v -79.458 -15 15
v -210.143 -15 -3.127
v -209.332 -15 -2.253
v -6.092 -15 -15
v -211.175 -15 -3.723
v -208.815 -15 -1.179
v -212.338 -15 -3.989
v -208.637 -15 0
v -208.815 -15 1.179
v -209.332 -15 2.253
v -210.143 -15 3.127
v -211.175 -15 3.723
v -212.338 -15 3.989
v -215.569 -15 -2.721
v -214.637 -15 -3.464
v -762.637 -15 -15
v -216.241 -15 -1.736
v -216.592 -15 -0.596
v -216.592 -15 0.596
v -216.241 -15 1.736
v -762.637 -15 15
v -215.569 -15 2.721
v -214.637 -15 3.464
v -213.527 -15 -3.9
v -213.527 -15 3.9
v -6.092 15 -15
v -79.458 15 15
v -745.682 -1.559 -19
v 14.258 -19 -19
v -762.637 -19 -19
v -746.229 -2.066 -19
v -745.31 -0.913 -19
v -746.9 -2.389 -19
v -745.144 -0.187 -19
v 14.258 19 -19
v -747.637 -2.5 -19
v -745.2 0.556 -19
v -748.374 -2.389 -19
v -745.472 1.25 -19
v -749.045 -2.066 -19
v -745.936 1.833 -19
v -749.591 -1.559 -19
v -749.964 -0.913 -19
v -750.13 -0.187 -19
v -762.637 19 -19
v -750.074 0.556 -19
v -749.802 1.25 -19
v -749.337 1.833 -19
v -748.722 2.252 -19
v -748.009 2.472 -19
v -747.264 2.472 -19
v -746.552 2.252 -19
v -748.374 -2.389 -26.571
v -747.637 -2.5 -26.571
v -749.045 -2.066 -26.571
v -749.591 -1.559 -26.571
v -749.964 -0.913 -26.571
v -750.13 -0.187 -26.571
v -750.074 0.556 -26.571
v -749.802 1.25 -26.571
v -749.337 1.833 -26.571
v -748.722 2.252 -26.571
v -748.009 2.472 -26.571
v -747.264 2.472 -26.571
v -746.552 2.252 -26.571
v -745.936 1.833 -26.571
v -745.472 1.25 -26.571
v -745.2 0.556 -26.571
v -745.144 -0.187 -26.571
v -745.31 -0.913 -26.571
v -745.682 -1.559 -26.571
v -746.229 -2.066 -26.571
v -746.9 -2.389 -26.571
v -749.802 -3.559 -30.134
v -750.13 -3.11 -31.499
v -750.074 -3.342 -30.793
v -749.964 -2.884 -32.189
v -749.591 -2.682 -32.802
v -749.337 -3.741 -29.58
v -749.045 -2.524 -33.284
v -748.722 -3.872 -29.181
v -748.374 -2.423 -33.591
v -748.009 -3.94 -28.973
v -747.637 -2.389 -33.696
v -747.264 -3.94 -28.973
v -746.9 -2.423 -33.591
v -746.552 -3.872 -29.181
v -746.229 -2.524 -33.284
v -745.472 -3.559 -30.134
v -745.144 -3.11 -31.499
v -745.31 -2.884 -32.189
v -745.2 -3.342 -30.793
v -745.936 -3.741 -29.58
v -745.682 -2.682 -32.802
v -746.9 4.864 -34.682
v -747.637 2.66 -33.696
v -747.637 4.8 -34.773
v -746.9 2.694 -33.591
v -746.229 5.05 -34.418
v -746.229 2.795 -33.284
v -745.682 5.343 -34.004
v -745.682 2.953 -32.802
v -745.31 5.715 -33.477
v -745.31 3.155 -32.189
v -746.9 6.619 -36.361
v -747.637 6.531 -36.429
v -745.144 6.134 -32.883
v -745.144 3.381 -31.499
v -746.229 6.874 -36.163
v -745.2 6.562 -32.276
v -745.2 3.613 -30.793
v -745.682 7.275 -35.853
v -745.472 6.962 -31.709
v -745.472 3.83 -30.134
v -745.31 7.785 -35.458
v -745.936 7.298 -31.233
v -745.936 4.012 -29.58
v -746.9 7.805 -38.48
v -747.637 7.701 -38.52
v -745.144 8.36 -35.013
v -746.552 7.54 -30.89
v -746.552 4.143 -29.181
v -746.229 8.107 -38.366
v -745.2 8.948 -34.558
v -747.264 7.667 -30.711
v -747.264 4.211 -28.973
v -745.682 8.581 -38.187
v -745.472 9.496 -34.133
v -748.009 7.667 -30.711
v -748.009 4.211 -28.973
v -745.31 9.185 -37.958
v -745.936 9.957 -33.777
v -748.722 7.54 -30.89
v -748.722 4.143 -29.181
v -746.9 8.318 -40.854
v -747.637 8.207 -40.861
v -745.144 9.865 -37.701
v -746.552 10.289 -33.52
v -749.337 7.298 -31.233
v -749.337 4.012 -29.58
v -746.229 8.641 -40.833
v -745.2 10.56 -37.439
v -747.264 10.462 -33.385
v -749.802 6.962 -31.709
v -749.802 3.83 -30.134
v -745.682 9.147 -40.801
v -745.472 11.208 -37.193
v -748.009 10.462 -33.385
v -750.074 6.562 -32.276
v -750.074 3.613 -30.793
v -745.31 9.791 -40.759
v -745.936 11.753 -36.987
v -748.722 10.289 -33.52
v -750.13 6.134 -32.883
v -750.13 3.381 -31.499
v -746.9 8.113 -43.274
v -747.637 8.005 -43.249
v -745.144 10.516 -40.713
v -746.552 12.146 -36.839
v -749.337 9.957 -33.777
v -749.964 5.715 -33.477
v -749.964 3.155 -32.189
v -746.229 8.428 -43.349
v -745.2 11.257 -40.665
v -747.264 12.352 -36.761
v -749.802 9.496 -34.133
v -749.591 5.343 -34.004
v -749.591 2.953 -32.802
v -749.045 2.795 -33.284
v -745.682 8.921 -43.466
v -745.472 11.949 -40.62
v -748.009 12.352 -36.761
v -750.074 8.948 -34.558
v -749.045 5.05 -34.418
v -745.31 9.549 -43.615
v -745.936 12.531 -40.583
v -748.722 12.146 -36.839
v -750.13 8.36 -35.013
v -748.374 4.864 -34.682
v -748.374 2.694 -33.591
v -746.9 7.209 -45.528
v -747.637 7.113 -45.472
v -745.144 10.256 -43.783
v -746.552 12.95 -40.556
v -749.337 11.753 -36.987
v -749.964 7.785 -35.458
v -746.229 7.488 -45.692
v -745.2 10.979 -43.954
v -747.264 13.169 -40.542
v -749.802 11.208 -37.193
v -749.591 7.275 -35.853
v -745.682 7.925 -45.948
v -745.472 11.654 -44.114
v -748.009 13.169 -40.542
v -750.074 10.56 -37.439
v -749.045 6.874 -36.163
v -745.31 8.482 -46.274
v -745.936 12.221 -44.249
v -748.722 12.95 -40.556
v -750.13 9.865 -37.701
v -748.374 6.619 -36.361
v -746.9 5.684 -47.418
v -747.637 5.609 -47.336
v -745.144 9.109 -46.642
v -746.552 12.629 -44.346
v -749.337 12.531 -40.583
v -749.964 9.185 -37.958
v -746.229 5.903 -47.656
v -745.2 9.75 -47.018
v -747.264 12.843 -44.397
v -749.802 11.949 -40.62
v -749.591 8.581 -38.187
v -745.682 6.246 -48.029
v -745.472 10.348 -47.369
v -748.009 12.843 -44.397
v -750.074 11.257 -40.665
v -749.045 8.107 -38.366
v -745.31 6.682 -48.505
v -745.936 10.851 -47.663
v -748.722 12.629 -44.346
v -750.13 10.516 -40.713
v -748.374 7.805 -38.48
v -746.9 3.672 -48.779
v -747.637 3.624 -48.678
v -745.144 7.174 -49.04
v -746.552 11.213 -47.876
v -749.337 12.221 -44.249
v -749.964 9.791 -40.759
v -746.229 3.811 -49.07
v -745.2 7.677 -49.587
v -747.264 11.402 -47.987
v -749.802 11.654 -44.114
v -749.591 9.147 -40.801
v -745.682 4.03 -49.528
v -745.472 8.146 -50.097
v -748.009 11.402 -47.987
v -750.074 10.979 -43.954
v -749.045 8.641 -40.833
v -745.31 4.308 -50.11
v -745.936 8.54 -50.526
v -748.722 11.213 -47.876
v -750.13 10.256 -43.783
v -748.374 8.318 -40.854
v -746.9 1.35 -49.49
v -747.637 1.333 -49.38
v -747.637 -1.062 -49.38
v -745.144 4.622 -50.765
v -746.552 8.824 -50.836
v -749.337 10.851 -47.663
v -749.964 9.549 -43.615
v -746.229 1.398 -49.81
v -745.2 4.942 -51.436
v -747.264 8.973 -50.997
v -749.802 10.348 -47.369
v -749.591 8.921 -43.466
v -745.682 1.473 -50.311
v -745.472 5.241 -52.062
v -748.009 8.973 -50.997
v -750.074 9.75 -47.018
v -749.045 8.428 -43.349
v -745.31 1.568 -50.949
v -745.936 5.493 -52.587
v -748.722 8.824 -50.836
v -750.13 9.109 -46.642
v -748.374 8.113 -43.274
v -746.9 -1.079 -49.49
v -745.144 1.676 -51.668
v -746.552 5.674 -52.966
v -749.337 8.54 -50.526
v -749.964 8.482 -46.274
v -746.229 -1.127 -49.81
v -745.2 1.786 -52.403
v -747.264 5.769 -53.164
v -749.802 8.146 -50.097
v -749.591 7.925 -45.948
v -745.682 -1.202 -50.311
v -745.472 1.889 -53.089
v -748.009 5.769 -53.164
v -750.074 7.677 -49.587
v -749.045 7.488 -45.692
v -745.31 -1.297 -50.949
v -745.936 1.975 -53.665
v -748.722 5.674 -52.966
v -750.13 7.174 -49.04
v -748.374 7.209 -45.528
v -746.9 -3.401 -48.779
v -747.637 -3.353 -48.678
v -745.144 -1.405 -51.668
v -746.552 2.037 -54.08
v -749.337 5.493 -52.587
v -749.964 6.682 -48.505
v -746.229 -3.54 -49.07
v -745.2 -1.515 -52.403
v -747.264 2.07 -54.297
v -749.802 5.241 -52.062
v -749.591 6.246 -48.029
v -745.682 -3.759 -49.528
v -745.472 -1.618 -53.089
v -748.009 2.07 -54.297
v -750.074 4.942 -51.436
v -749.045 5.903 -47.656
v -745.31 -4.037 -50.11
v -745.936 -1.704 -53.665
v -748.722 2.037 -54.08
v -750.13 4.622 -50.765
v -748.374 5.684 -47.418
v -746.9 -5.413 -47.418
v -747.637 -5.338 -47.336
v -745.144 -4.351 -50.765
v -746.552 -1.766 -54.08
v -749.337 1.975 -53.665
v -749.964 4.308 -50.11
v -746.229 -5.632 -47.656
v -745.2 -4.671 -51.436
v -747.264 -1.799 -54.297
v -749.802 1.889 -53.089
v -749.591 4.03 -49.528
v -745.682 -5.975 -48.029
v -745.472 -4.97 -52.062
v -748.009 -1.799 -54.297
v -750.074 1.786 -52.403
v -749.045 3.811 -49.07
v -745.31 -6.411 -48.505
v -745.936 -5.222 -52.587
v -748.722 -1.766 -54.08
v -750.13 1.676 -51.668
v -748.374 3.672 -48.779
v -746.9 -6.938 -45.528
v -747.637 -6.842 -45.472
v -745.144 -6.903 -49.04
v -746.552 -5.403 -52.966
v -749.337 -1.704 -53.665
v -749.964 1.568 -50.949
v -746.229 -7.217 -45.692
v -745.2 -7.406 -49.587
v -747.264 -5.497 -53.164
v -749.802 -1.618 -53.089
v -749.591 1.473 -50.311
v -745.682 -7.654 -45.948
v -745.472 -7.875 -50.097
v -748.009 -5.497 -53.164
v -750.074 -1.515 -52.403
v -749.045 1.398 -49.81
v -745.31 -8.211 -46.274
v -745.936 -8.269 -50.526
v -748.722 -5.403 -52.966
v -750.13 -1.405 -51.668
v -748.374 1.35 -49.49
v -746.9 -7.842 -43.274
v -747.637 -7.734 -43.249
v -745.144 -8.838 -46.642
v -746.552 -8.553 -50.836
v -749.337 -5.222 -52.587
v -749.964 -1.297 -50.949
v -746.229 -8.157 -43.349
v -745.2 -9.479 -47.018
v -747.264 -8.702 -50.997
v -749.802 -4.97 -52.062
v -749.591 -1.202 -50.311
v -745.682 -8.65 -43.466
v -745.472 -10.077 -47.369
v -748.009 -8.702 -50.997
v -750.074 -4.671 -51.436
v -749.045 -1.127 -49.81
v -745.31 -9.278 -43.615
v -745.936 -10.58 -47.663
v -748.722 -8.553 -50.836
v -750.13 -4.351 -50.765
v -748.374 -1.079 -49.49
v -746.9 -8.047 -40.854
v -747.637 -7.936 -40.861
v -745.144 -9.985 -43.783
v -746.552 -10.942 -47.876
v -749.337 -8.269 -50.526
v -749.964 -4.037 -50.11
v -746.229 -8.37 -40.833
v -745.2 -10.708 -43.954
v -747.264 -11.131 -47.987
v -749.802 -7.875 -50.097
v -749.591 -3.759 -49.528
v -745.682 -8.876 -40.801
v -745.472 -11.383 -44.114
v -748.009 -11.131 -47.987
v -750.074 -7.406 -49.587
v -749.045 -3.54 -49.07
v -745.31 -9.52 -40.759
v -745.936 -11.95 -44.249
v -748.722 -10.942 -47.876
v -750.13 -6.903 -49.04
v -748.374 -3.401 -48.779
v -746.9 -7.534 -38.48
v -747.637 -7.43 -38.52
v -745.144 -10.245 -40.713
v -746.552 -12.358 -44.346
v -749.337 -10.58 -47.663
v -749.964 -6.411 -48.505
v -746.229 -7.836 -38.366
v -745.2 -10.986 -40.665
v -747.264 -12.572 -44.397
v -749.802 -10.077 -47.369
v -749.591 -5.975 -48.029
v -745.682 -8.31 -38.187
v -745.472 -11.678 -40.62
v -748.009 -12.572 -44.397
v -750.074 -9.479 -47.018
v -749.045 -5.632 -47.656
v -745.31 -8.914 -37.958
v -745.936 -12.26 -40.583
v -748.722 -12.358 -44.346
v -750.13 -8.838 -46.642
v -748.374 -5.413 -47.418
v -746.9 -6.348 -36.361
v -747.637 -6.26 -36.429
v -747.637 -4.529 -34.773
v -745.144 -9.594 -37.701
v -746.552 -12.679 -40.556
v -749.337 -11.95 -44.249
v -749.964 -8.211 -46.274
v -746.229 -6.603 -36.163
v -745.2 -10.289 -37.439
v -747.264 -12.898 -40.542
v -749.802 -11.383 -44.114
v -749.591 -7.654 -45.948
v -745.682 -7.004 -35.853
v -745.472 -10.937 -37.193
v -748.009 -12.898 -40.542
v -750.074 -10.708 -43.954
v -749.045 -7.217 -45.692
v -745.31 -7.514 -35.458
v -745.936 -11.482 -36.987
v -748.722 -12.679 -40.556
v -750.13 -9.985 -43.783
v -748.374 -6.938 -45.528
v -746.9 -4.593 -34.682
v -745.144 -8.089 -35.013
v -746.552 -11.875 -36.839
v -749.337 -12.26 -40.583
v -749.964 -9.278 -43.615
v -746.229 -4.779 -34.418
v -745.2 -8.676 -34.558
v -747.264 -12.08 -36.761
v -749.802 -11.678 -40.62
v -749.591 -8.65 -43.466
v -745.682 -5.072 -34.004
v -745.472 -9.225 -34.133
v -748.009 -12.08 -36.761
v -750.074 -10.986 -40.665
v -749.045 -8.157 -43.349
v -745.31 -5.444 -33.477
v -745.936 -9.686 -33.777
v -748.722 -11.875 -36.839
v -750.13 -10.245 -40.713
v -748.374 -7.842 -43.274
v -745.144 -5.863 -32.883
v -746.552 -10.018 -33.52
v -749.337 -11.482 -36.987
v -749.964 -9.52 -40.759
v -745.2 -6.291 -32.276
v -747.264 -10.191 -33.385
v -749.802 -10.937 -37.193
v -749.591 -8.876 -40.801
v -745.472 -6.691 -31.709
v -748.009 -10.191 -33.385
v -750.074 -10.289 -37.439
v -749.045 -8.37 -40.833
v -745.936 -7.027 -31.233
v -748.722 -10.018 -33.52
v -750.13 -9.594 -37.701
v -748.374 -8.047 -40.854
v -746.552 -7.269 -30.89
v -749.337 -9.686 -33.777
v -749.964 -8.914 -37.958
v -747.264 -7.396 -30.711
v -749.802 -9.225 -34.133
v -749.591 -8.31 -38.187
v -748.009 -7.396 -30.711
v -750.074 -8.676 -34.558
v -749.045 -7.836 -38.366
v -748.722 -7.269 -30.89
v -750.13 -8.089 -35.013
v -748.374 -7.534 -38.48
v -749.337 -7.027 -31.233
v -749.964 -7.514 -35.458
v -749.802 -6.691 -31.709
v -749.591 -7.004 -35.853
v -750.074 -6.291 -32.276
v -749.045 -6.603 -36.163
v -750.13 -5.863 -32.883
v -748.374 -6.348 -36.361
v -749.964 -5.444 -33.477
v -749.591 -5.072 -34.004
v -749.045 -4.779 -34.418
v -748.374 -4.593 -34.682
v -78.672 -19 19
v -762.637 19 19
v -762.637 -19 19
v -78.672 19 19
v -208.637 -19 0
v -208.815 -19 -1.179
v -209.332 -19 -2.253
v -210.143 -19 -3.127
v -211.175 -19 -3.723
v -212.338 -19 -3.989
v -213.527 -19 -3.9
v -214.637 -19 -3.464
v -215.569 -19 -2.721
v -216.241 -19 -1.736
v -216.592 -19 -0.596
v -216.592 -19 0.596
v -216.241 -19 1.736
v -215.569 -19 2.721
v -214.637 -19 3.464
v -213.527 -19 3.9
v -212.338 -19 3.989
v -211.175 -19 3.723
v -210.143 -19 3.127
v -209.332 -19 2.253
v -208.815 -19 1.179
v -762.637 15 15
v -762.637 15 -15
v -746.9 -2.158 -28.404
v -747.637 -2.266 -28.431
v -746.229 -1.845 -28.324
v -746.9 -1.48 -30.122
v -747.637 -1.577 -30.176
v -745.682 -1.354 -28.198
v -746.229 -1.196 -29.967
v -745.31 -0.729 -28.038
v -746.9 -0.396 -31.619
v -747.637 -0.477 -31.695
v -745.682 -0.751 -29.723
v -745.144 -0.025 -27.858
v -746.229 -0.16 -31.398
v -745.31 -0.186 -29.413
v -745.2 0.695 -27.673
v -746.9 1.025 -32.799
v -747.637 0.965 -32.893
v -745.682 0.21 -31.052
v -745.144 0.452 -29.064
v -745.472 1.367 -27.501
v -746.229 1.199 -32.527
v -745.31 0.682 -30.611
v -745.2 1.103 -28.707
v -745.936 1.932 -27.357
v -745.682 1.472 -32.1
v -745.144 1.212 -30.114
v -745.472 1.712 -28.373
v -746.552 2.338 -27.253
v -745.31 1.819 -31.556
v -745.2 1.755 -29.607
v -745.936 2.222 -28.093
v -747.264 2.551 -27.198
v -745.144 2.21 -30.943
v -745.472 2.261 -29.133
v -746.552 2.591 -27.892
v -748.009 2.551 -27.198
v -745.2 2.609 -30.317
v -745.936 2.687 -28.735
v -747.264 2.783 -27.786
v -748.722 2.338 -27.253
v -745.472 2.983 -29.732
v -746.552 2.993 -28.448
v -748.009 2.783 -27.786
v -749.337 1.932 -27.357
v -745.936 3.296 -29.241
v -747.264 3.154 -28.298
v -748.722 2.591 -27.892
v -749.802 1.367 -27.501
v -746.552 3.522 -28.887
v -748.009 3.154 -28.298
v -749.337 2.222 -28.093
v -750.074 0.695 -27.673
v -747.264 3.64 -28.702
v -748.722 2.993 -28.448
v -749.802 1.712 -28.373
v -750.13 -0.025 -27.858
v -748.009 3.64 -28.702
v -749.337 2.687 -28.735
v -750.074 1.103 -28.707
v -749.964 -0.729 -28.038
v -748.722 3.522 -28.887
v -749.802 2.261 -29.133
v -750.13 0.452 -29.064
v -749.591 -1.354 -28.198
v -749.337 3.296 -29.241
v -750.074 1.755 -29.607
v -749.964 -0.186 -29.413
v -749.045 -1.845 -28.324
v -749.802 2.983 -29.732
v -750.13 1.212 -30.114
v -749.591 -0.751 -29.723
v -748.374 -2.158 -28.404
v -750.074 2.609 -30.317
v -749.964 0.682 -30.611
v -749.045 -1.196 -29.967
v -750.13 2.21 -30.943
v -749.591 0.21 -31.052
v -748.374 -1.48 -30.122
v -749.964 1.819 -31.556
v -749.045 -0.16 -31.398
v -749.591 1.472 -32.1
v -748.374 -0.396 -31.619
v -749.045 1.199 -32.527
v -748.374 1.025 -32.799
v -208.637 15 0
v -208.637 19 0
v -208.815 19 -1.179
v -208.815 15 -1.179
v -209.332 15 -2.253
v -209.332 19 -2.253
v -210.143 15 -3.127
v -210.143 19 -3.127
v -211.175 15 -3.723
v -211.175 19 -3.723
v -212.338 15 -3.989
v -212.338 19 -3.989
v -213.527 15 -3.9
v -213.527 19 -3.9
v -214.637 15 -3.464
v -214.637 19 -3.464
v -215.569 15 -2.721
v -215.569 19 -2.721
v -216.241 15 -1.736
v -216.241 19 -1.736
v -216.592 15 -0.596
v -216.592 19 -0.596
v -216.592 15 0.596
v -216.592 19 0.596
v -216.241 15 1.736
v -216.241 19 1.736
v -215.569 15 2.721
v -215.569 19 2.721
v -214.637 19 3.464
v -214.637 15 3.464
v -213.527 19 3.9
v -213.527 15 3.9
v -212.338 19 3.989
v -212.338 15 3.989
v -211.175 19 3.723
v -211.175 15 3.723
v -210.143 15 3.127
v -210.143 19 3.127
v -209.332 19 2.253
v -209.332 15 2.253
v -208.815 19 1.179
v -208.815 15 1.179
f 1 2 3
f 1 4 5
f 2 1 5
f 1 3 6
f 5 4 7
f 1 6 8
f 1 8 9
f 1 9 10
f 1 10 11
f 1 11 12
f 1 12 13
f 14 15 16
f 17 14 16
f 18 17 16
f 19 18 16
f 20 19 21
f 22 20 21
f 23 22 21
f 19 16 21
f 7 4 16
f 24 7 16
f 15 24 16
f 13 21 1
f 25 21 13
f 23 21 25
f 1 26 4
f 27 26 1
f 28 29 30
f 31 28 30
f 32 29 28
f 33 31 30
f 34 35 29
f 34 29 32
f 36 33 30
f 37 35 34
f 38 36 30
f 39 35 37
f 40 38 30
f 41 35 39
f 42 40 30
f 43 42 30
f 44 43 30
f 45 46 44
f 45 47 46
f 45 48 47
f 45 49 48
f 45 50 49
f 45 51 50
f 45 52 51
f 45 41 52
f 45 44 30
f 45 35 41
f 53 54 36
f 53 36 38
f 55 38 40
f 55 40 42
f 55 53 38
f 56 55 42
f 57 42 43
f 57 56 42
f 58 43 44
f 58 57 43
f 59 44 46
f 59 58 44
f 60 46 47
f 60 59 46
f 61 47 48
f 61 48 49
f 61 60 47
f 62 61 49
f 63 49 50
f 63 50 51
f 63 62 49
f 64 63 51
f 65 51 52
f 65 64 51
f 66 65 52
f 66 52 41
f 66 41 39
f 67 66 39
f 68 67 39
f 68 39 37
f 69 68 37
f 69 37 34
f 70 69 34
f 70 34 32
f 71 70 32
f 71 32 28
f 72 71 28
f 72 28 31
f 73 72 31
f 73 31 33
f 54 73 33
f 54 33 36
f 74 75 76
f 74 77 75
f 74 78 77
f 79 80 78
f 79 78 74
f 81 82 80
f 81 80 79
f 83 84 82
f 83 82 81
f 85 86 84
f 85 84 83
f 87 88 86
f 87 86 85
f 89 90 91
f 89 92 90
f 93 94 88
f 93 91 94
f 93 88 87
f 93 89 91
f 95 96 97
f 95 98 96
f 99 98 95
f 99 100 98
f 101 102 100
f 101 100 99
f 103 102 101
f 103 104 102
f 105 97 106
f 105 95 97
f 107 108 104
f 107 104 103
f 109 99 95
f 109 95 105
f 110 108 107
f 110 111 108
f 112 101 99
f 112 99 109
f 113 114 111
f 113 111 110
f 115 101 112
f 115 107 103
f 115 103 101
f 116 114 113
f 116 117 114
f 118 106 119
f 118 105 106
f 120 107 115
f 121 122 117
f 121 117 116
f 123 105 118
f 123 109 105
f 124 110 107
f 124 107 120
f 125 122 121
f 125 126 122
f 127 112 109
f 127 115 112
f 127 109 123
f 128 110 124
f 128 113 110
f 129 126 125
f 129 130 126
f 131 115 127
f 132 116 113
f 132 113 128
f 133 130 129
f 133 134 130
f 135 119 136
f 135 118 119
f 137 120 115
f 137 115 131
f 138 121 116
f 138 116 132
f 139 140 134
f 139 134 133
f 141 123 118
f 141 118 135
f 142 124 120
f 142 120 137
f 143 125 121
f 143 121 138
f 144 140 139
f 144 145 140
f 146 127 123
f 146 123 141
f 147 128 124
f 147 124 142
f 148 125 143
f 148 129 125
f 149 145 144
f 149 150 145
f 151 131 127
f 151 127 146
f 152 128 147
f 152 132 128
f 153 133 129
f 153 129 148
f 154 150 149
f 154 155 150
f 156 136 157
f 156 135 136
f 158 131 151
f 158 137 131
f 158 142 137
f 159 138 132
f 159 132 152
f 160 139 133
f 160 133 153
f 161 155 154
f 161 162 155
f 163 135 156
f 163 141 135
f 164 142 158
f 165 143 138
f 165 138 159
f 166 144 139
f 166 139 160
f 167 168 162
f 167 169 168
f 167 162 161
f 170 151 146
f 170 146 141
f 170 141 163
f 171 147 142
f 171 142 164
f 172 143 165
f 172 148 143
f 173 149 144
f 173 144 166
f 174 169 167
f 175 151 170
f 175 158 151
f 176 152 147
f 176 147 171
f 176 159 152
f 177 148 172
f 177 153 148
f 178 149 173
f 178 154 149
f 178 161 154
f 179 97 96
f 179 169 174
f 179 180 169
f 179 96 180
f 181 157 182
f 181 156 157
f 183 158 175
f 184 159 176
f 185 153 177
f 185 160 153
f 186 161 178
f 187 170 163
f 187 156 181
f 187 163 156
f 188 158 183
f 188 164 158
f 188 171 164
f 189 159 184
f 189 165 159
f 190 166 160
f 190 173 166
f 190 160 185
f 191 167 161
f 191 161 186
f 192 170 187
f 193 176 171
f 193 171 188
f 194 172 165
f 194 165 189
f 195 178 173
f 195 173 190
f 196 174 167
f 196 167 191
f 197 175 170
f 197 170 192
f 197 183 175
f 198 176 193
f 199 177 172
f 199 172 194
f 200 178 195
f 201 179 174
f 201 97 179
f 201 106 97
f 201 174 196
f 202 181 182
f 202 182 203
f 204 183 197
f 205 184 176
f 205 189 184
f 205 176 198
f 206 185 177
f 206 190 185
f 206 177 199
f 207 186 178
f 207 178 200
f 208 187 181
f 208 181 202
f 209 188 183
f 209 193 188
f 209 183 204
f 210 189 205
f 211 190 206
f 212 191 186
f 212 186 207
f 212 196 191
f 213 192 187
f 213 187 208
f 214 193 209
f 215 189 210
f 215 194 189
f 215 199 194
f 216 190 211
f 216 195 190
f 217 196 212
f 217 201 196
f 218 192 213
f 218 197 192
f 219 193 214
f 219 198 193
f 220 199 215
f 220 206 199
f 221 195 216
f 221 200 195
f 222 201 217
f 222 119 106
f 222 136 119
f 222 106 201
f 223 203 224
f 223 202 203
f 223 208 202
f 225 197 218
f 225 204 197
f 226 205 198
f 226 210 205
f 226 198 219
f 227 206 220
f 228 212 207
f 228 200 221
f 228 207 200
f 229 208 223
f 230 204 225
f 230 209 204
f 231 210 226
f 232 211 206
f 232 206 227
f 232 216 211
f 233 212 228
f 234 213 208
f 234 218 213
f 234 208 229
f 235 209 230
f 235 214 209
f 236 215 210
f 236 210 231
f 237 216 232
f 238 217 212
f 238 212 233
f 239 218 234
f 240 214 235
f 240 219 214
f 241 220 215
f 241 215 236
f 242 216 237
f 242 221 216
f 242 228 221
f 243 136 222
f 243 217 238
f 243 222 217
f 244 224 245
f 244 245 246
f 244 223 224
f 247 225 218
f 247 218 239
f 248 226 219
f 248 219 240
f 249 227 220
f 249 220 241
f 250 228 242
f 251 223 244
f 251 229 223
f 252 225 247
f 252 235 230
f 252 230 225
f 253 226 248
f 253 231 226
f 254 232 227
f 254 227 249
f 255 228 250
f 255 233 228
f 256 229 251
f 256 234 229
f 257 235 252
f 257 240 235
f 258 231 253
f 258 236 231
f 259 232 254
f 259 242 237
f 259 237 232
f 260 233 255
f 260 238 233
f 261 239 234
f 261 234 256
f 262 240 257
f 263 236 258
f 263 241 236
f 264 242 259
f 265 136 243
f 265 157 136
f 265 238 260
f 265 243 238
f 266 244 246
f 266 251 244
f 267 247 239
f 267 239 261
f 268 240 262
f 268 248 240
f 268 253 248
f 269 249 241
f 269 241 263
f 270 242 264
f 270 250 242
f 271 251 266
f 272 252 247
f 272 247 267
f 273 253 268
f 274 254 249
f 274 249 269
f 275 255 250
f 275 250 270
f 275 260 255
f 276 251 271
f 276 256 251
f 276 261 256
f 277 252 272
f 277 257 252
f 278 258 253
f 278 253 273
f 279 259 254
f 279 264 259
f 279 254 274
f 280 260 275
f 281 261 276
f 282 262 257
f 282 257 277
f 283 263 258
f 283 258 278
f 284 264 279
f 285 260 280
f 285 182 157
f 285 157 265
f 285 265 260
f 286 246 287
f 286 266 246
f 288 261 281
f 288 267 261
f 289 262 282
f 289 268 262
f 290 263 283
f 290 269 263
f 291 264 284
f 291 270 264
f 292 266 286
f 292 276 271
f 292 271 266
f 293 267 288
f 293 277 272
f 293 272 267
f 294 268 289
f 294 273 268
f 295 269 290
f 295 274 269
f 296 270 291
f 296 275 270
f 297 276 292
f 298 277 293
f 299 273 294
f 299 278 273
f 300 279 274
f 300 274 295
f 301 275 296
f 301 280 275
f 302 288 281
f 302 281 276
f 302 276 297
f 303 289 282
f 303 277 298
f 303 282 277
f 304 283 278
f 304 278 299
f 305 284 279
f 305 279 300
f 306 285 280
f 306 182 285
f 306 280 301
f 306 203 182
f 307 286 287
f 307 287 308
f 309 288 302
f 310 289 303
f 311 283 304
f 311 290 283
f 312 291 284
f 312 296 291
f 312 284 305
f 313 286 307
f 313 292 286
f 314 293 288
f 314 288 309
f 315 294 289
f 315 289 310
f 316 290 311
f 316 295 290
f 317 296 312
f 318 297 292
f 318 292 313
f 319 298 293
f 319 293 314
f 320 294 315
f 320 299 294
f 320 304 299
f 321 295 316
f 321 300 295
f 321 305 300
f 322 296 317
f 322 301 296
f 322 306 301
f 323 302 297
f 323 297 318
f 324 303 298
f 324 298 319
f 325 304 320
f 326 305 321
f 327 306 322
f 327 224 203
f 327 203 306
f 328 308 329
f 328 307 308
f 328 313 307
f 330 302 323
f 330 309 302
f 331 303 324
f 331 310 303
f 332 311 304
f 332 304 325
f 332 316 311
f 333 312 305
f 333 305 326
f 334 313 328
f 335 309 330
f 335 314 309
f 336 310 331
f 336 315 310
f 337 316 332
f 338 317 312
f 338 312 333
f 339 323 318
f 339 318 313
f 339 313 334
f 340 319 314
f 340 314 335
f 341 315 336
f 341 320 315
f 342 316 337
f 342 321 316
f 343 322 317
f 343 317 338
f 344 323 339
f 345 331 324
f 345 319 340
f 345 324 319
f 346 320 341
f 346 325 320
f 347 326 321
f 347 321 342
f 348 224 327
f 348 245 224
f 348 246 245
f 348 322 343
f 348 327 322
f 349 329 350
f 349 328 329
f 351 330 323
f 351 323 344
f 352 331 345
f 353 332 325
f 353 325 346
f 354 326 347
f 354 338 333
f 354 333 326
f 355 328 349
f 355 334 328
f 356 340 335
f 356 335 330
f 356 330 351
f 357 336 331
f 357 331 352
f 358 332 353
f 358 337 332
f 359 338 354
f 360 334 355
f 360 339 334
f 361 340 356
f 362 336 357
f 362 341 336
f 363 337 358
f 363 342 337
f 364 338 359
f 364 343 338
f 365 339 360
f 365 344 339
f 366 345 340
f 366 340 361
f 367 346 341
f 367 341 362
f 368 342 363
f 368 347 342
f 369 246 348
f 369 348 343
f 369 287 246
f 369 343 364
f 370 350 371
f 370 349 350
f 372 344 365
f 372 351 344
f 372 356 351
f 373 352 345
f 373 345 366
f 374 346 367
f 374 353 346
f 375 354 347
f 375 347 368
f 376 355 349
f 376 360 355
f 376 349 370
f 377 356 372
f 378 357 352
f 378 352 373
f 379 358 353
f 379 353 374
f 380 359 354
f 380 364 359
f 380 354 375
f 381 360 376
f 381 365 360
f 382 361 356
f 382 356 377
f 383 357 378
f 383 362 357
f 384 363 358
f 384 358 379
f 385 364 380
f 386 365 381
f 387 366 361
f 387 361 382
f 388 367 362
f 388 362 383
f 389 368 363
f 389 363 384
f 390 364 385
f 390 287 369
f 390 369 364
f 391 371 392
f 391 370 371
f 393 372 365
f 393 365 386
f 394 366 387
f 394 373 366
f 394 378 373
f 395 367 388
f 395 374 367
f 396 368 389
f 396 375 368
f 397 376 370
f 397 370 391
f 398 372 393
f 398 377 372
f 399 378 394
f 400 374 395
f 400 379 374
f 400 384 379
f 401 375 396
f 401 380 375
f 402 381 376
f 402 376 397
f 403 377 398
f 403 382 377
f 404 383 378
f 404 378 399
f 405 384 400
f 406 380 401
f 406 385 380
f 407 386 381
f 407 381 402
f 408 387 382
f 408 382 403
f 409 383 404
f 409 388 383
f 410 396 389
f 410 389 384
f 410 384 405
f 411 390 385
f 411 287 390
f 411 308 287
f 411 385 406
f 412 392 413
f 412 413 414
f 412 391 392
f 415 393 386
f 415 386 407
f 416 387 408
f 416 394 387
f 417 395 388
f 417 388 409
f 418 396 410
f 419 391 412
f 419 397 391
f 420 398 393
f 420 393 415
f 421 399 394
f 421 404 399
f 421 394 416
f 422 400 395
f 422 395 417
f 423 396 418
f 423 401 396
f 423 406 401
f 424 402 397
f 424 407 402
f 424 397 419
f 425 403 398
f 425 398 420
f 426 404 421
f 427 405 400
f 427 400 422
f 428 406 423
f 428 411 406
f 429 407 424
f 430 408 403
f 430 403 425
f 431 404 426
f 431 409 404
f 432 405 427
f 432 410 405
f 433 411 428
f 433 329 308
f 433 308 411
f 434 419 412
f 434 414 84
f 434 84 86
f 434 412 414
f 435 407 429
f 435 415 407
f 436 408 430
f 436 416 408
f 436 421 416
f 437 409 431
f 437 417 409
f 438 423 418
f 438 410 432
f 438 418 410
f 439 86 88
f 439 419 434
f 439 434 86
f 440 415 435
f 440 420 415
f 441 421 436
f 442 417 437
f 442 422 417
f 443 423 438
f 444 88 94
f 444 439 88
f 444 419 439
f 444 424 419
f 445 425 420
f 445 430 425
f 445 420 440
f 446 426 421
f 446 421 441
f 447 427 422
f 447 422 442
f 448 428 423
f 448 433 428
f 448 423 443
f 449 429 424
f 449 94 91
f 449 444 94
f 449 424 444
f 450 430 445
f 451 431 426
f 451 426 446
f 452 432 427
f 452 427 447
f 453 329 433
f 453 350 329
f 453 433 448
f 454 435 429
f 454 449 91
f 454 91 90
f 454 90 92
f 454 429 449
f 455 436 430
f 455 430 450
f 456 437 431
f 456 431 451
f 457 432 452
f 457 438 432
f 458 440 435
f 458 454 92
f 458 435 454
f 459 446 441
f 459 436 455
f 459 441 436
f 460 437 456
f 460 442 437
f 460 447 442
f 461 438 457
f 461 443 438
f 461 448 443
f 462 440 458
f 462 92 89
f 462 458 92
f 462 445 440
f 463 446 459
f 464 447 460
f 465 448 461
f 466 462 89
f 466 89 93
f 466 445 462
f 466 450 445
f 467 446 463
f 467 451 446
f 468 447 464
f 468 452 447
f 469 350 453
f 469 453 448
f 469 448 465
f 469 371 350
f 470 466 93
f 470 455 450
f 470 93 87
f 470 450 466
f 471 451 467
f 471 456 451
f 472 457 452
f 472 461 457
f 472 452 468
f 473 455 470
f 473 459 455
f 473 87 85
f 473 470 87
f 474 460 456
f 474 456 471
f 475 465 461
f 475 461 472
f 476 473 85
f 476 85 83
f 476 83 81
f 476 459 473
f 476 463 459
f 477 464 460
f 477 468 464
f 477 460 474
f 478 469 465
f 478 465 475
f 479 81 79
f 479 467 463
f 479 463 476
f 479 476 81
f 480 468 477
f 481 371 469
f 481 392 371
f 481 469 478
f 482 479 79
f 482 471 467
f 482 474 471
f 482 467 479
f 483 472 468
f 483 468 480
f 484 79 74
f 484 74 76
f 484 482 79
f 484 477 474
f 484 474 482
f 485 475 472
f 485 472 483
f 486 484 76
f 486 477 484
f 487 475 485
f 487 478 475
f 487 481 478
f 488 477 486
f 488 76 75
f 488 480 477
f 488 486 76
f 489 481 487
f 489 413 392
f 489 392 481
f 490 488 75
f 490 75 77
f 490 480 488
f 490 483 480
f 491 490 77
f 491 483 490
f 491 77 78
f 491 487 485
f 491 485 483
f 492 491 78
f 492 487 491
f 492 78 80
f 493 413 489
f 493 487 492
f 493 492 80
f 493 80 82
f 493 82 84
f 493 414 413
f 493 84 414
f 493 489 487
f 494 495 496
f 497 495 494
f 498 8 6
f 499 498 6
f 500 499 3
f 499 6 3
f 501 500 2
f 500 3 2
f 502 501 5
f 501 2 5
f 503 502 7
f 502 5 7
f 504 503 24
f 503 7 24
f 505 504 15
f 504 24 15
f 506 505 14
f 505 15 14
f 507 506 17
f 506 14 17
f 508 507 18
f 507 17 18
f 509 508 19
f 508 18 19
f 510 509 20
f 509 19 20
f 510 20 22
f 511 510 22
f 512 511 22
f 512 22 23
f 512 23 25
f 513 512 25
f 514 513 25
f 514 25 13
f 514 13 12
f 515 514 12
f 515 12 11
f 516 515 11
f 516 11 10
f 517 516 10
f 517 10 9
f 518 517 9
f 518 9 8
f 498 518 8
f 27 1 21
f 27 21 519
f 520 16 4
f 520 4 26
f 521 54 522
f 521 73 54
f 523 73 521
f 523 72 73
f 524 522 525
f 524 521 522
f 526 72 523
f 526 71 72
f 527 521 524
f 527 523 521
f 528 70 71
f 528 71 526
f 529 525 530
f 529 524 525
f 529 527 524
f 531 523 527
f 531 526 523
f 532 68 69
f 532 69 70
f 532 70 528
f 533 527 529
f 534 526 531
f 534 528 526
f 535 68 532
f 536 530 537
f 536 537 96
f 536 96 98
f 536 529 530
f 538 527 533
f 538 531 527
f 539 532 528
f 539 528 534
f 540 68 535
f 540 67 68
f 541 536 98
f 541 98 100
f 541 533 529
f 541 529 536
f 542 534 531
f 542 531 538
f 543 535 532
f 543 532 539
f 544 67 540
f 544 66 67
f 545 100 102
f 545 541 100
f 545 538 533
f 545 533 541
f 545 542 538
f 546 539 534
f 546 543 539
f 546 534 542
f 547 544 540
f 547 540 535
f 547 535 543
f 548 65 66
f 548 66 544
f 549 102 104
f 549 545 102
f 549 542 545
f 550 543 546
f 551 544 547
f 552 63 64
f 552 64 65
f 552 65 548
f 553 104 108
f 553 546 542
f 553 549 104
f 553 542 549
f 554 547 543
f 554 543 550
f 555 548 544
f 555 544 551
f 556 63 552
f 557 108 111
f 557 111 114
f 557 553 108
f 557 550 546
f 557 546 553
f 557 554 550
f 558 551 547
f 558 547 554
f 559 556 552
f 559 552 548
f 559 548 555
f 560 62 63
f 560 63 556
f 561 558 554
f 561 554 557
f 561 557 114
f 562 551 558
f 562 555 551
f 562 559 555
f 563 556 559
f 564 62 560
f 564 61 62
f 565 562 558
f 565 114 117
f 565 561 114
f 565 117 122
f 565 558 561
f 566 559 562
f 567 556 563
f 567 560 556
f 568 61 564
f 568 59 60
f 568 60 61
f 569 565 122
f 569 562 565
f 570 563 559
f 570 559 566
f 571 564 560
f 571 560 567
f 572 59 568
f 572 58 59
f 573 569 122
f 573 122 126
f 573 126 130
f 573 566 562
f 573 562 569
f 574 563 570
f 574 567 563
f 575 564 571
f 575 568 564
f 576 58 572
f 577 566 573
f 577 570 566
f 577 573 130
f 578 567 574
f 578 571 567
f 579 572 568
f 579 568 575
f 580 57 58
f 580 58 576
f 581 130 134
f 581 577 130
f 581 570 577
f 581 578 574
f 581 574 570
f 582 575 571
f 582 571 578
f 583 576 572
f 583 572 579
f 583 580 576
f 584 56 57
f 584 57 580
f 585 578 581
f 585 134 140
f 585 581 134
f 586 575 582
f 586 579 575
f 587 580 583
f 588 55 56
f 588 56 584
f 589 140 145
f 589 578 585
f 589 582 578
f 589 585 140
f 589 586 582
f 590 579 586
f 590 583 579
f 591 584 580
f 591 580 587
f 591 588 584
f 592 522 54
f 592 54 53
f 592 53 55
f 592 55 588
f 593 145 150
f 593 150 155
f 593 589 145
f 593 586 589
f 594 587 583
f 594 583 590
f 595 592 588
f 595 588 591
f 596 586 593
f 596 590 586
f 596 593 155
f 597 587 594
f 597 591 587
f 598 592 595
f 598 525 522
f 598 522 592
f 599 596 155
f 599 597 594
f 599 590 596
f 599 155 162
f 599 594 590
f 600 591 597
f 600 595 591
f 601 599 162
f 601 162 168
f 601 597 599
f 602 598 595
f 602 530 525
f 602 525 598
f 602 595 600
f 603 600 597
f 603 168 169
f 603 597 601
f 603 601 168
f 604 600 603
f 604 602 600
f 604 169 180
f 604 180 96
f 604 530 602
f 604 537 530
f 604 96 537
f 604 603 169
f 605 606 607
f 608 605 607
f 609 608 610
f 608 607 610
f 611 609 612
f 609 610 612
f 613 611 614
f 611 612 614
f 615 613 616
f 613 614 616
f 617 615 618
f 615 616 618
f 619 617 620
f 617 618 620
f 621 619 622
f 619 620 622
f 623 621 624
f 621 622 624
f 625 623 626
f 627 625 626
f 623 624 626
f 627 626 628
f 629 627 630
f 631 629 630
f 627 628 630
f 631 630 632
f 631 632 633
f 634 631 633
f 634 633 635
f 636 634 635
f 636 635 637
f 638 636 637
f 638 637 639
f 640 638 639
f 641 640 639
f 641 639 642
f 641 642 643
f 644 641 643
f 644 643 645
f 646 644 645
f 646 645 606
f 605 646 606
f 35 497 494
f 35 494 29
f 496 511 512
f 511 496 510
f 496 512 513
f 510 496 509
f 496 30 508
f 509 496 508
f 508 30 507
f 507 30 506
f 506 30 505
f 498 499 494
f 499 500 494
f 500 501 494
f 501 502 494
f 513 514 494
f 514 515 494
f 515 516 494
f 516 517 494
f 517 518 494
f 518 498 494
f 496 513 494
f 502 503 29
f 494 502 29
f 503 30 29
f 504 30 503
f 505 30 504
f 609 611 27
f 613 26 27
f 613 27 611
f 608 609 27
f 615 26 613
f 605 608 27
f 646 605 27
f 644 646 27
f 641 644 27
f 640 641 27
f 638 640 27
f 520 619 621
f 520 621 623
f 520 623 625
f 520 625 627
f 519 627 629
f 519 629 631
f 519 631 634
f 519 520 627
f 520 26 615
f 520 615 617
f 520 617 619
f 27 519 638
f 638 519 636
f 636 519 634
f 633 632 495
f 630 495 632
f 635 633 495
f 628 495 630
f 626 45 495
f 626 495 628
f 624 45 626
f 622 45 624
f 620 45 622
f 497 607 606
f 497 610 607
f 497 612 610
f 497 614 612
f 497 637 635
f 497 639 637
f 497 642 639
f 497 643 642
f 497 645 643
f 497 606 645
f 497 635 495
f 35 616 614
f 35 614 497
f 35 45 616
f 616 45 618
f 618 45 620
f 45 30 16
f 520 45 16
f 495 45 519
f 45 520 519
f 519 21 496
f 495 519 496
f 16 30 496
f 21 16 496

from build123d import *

# Parameters (mm, degrees)
SKETCH2_W           = 38
SKETCH2_H           = 38
SKETCH3_W           = 30
SKETCH3_H           = 30
SKETCH4_R           = 4
CUT_EXTRUDE1_DEPTH  = 764.819309892
SWEEP2_PROFILE_R    = 2.5
CUT_EXTRUDE2_DEPTH  = 766.523252428
BOSS_EXTRUDE1_DEPTH = 38
SKETCH22_W          = 30
SKETCH22_H          = 30
CUT_EXTRUDE3_DEPTH  = 837.549484437
CUT_EXTRUDE4_DEPTH  = 766.523252428
CUT_EXTRUDE5_DEPTH  = 766.523252428
BOSS_EXTRUDE2_REACH = 767.523


with BuildPart() as part:
    # Sweep1: sweep along a path in Sketch1
    with BuildLine(Plane(origin=(0, 0, 0), x_dir=(1, 0, 0), z_dir=(0, 1, 0))) as sweep1_path:
        Line((0, 0), (-762.63683242, 0))
    # Sketch2 → Sweep1 (sweep)
    with BuildSketch(Plane(origin=(0, 0, 0), x_dir=(0, 0, -1), z_dir=(1, 0, 0))):
        Rectangle(SKETCH2_W, SKETCH2_H)
    sweep(path=sweep1_path.line)

    # Cut-Sweep1: sweep along a path in Sketch1<2>
    with BuildLine(Plane(origin=(0, 0, 0), x_dir=(1, 0, 0), z_dir=(0, 1, 0))) as cut_sweep1_path:
        Line((0, 0), (-762.63683242, 0))
    # Sketch3 → Cut-Sweep1 (sweep, cut)
    with BuildSketch(Plane(origin=(0, 0, 0), x_dir=(0, 0, -1), z_dir=(1, 0, 0))):
        Rectangle(SKETCH3_W, SKETCH3_H)
    sweep(path=cut_sweep1_path.line, mode=Mode.SUBTRACT)

    # Sketch4 → Cut-Extrude1 (cut, through all)
    with BuildSketch(Plane(origin=(0, 19, 0), x_dir=(1, 0, 0), z_dir=(0, 1, 0))):
        with Locations((-212.63683242, 0)):
            Circle(SKETCH4_R)
    extrude(amount=-CUT_EXTRUDE1_DEPTH, mode=Mode.SUBTRACT)

    # Sweep2: sweep along a path in Sketch5
    with BuildLine(Plane.ZY.offset(747.63683242)) as sweep2_path:
        Line((-19, 0), (-26.570946825, 0))
        ThreePointArc((-26.570946825, 0), (-29.503401087, 0.950220747), (-31.321263798, 3.4397152))
        ThreePointArc((-31.321263798, 3.4397152), (-51.969366005, 0.135523131), (-31.321263798, -3.168668939))
    # Sweep2 profile (on start of the path) → Sweep2 (sweep)
    with BuildSketch(Plane(origin=(-747.63683242, 0, -19), x_dir=(0, -1, 0), z_dir=(0, 0, -1))):
        Circle(SWEEP2_PROFILE_R)
    sweep(path=sweep2_path.line)

    # Sketch16 → Cut-Extrude2 (cut, through all)
    with BuildSketch(Plane(origin=(0, 19, 0), x_dir=(1, 0, 0), z_dir=(0, 1, 0))):
        Polygon((0, -19), (0, 19), (-71.907398101, -19), align=None)
    extrude(amount=-CUT_EXTRUDE2_DEPTH, mode=Mode.SUBTRACT)

    # Sketch17 → Boss-Extrude1 (add)
    with BuildSketch(Plane(origin=(0, 19, 0), x_dir=(1, 0, 0), z_dir=(0, 1, 0))):
        Polygon((-71.907398101, -19), (0, -19), (71.921211139, 19), (0, 19), align=None)
    extrude(amount=-BOSS_EXTRUDE1_DEPTH)

    # Sketch22 → Cut-Extrude3 (cut, through all)
    with BuildSketch(Plane.ZY.offset(762.63683242)):
        Rectangle(SKETCH22_W, SKETCH22_H)
    extrude(amount=-CUT_EXTRUDE3_DEPTH, mode=Mode.SUBTRACT)

    # Sketch23 → Cut-Extrude4 (cut, through all)
    with BuildSketch(Plane(origin=(0, 19, 0), x_dir=(1, 0, 0), z_dir=(0, 1, 0))):
        Polygon((14.258492684, 0), (-32.20683242, -19), (0, -19), (71.921211139, 19), (60.723817789, 19), align=None)
    extrude(amount=-CUT_EXTRUDE4_DEPTH, mode=Mode.SUBTRACT)

    # Sketch24 → Cut-Extrude5 (cut, through all)
    with BuildSketch(Plane(origin=(0, 19, 0), x_dir=(1, 0, 0), z_dir=(0, 1, 0))):
        Polygon((-78.672157524, -19), (14.258492684, 19), (60.723817789, 19), (-32.20683242, -19), align=None)
    extrude(amount=-CUT_EXTRUDE5_DEPTH, mode=Mode.SUBTRACT)

    # Sketch25 → Boss-Extrude2 (add, up to next)
    with BuildSketch(Plane(origin=(0, 19, 0), x_dir=(1, 0, 0), z_dir=(0, 1, 0)), mode=Mode.PRIVATE) as boss_extrude2_sk1:
        Polygon((3.690100071, 19), (-89.240550137, -19), (-78.672157524, -19), (14.258492684, 19), align=None)
    boss_extrude2_tool1 = extrude(boss_extrude2_sk1.sketch, amount=-BOSS_EXTRUDE2_REACH, mode=Mode.PRIVATE) - part.part
    add(boss_extrude2_tool1.solids().sort_by_distance((-37.491029, 19, 0))[0])


solid = part.part
